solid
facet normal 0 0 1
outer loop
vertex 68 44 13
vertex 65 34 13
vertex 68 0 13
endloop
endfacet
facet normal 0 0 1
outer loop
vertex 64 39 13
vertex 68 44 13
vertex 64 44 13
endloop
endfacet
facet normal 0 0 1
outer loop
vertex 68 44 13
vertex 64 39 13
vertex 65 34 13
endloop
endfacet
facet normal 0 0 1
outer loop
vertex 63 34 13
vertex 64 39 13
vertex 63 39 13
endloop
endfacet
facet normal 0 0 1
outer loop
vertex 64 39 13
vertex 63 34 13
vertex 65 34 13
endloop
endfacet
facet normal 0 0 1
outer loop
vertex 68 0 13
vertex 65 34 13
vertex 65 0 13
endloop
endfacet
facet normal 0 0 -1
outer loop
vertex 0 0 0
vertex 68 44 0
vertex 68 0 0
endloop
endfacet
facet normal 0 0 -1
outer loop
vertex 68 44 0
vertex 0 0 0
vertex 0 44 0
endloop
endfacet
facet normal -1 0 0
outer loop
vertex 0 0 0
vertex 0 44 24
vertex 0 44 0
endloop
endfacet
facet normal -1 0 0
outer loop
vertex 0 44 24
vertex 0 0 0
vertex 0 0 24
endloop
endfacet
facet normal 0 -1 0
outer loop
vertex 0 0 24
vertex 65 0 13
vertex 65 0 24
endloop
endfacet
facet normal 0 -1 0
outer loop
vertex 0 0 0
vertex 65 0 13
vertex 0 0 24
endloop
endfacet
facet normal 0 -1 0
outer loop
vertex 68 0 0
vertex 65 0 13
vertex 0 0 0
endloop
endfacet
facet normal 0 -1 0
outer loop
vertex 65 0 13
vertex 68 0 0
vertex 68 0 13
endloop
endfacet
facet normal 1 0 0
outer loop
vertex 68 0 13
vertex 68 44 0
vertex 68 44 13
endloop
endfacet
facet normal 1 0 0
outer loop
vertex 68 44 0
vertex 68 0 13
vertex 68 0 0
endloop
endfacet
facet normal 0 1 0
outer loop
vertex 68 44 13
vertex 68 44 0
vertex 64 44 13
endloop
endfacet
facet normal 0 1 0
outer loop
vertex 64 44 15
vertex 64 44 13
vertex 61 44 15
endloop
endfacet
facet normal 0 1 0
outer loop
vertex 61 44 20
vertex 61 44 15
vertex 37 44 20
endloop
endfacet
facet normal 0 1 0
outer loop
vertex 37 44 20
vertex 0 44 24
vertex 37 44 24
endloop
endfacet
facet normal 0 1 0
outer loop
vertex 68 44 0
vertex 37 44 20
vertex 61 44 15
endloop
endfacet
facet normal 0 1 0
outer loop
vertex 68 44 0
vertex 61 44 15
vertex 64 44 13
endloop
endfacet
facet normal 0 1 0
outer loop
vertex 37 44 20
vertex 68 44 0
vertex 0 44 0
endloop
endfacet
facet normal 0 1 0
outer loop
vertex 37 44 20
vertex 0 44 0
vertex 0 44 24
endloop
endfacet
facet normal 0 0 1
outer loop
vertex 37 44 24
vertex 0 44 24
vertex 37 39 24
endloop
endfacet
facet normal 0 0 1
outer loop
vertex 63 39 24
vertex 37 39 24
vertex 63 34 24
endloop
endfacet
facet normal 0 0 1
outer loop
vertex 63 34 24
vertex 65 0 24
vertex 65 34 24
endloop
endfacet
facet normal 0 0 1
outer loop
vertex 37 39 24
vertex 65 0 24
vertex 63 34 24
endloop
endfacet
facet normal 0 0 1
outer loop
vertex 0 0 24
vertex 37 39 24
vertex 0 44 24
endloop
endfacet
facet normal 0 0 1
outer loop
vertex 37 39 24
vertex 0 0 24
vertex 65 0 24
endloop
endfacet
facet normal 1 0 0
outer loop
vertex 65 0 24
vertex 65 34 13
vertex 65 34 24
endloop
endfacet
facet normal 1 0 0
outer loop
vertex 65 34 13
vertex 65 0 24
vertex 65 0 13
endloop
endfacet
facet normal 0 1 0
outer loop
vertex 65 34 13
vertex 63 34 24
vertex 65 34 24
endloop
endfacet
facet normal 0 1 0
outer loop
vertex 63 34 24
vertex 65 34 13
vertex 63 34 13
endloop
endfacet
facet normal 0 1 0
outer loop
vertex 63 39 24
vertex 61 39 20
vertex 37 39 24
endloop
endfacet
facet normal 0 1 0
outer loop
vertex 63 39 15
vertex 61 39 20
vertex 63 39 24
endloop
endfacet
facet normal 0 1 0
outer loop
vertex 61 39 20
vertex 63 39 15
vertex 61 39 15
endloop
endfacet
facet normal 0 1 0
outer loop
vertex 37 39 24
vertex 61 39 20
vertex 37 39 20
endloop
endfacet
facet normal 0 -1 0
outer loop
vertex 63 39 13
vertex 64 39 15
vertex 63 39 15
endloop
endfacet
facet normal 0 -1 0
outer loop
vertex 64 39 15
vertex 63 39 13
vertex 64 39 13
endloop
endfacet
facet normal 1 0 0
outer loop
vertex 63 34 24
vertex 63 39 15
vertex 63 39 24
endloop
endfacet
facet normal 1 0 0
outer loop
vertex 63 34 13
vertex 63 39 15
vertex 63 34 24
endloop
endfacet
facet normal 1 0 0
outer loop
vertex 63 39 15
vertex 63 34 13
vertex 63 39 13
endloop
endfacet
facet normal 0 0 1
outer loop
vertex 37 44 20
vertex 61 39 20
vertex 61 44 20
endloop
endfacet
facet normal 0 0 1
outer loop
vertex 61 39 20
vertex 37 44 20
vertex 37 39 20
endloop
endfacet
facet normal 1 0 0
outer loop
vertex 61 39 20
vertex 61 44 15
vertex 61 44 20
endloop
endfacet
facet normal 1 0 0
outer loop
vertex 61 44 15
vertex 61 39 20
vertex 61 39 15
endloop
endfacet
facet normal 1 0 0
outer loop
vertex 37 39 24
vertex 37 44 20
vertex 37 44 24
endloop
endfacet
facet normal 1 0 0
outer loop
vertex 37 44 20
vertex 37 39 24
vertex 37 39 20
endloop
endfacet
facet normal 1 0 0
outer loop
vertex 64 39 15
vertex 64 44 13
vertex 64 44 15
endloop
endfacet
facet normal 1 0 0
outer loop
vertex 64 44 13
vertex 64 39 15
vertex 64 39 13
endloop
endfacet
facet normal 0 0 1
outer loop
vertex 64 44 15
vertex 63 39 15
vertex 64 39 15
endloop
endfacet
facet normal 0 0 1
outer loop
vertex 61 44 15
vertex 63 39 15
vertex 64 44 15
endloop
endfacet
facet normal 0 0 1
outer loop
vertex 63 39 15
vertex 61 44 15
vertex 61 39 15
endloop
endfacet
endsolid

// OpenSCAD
translate([8.5, 5.5, 6.5]) color([0.4226528937805498, 0.8924289339928592, 0.21652428395276402]) cube([17, 11, 13], center=true);
translate([25.5, 5.5, 6.5]) color([0.4352131794546169, 0.35803513461315506, 0.17693553603496914]) cube([17, 11, 13], center=true);
translate([42.5, 5.5, 6.5]) color([0.32881318575191665, 0.9867958186960467, 0.7473090097951195]) cube([17, 11, 13], center=true);
translate([59.5, 5.5, 6.5]) color([0.3826682791831585, 0.40928443439993156, 0.2637409011550663]) cube([17, 11, 13], center=true);
translate([8.5, 16.5, 6.5]) color([0.531336678598825, 0.7356369121419466, 0.686646615750601]) cube([17, 11, 13], center=true);
translate([25.5, 16.5, 6.5]) color([0.46264983534131954, 0.041939046716157, 0.9215078064992686]) cube([17, 11, 13], center=true);
translate([42.5, 16.5, 6.5]) color([0.4089338030960661, 0.3902988670119316, 0.0031101144891549914]) cube([17, 11, 13], center=true);
translate([59.5, 16.5, 6.5]) color([0.13822721408191307, 0.8688534175006787, 0.513934596181303]) cube([17, 11, 13], center=true);
translate([8.5, 27.5, 6.5]) color([0.7324348442226767, 0.14816788643335854, 0.33005100665524945]) cube([17, 11, 13], center=true);
translate([25.5, 27.5, 6.5]) color([0.8401365565378639, 0.8206585211774247, 0.2467942680862406]) cube([17, 11, 13], center=true);
translate([42.5, 27.5, 6.5]) color([0.021975308333072263, 0.8064669735456029, 0.16884400503942165]) cube([17, 11, 13], center=true);
translate([59.5, 27.5, 6.5]) color([0.7876813921208954, 0.6836592298851071, 0.1683147603108942]) cube([17, 11, 13], center=true);
translate([8.5, 38.5, 6.5]) color([0.0784886436699127, 0.9276494299222889, 0.5978783972833935]) cube([17, 11, 13], center=true);
translate([25.5, 38.5, 6.5]) color([0.620510173056511, 0.4575118028380537, 0.15007097732228858]) cube([17, 11, 13], center=true);
translate([42.5, 38.5, 6.5]) color([0.6019699129465877, 0.2524728800375037, 0.8058946560175415]) cube([17, 11, 13], center=true);
translate([59.5, 38.5, 6.5]) color([0.732718954805416, 0.027267185045511733, 0.9324230096450348]) cube([17, 11, 13], center=true);
translate([8.5, 6.5, 18.5]) color([0.03631604832667812, 0.0896193188307074, 0.2927345609042453]) cube([17, 13, 11], center=true);
translate([25.5, 6.5, 18.5]) color([0.1508090604701401, 0.2361450829166024, 0.3558094886115547]) cube([17, 13, 11], center=true);
translate([42.5, 6.5, 18.5]) color([0.7354997154547138, 0.4047113607648444, 0.2698397547254259]) cube([17, 13, 11], center=true);
translate([6.5, 16.5, 18.5]) color([0.4923131536276696, 0.39259324978876053, 0.310764197486207]) cube([13, 7, 11], center=true);
translate([19.5, 16.5, 18.5]) color([0.900541657866744, 0.5504484509596044, 0.9773275109747672]) cube([13, 7, 11], center=true);
translate([32.5, 16.5, 18.5]) color([0.7729124093934382, 0.570499297619577, 0.26244658927686404]) cube([13, 7, 11], center=true);
translate([45.5, 16.5, 18.5]) color([0.6868436562888387, 0.45591771896977173, 0.7213877150417534]) cube([13, 7, 11], center=true);
translate([58.5, 16.5, 18.5]) color([0.40377880891106155, 0.49600503631794757, 0.02068376744575562]) cube([13, 7, 11], center=true);
translate([6.5, 23.5, 18.5]) color([0.739958502320053, 0.03427354435563068, 0.6807253858476396]) cube([13, 7, 11], center=true);
translate([19.5, 23.5, 18.5]) color([0.5820036955379622, 0.7759176114881267, 0.28977759923741564]) cube([13, 7, 11], center=true);
translate([32.5, 23.5, 18.5]) color([0.6861108151233298, 0.20709797563103816, 0.5292720013578311]) cube([13, 7, 11], center=true);
translate([45.5, 23.5, 18.5]) color([0.34028037925118015, 0.9784545513570129, 0.9718665573793185]) cube([13, 7, 11], center=true);
translate([58.5, 23.5, 18.5]) color([0.20896973547336006, 0.5660382358858294, 0.3294426858782725]) cube([13, 7, 11], center=true);
translate([6.5, 30.5, 18.5]) color([0.9685381870202809, 0.9245259481865659, 0.5861458530564896]) cube([13, 7, 11], center=true);
translate([19.5, 30.5, 18.5]) color([0.7200844551084937, 0.6813247567090696, 0.353355632443361]) cube([13, 7, 11], center=true);
translate([32.5, 30.5, 18.5]) color([0.91636156937516, 0.899453536816357, 0.33065846447807934]) cube([13, 7, 11], center=true);
translate([45.5, 30.5, 18.5]) color([0.7473949106043586, 0.009092126674448586, 0.8163591105584419]) cube([13, 7, 11], center=true);
translate([58.5, 30.5, 18.5]) color([0.5648693453979996, 0.9523067127509502, 0.3631930745481745]) cube([13, 7, 11], center=true);
translate([54.5, 6.5, 18.5]) color([0.6257130749033707, 0.3230024315033787, 0.7827853814039997]) cube([7, 13, 11], center=true);
translate([61.5, 6.5, 18.5]) color([0.6007029967830003, 0.9874710229786893, 0.0010127930964535237]) cube([7, 13, 11], center=true);
translate([3.5, 36.5, 18.5]) color([0.14075874215813544, 0.043601382090813434, 0.1258478488128345]) cube([7, 5, 11], center=true);
translate([10.5, 36.5, 18.5]) color([0.9293852970698306, 0.9486082995058949, 0.4804125346981437]) cube([7, 5, 11], center=true);
translate([17.5, 36.5, 18.5]) color([0.9466893945947962, 0.818387610188399, 0.7786177341461099]) cube([7, 5, 11], center=true);
translate([24.5, 36.5, 18.5]) color([0.747281950803196, 0.18765458516959888, 0.5488772611027803]) cube([7, 5, 11], center=true);
translate([31.5, 36.5, 18.5]) color([0.4238792306088448, 0.949788047597888, 0.17383353806681645]) cube([7, 5, 11], center=true);
translate([38.5, 36.5, 18.5]) color([0.16985884355967462, 0.6588617536380149, 0.15740178957348283]) cube([7, 5, 11], center=true);
translate([45.5, 36.5, 18.5]) color([0.11005367295186075, 0.5039231973300066, 0.796660971220008]) cube([7, 5, 11], center=true);
translate([52.5, 36.5, 18.5]) color([0.6050456716470326, 0.7547539728480395, 0.2657585316255522]) cube([7, 5, 11], center=true);
translate([59.5, 36.5, 18.5]) color([0.28496283302929337, 0.42870364173152453, 0.990847884265713]) cube([7, 5, 11], center=true);
translate([3.5, 41.5, 18.5]) color([0.7179182565245089, 0.9462539572878983, 0.537870455736408]) cube([7, 5, 11], center=true);
translate([10.5, 41.5, 18.5]) color([0.5545598515713968, 0.9900903354753839, 0.18998827565888077]) cube([7, 5, 11], center=true);
translate([17.5, 41.5, 18.5]) color([0.7825904371715813, 0.7915138240285756, 0.8447416276181308]) cube([7, 5, 11], center=true);
translate([24.5, 41.5, 18.5]) color([0.7500527092169327, 0.15533301818854706, 0.661127632121674]) cube([7, 5, 11], center=true);
translate([29.5, 41.5, 16.5]) color([0.9237031845862264, 0.5632851524959844, 0.3609415103802872]) cube([3, 5, 7], center=true);
translate([32.5, 41.5, 16.5]) color([0.9495201486078587, 0.5615986504586717, 0.41163639453549183]) cube([3, 5, 7], center=true);
translate([35.5, 41.5, 16.5]) color([0.6141334980612769, 0.8041250166314531, 0.22830209061365048]) cube([3, 5, 7], center=true);
translate([38.5, 41.5, 16.5]) color([0.01569204302297844, 0.5290948970731422, 0.9413574200758085]) cube([3, 5, 7], center=true);
translate([41.5, 41.5, 16.5]) color([0.6802579626031922, 0.6309080001300065, 0.6278151474899732]) cube([3, 5, 7], center=true);
translate([44.5, 41.5, 16.5]) color([0.4969897122617175, 0.7309192697350546, 0.2491944400337247]) cube([3, 5, 7], center=true);
translate([47.5, 41.5, 16.5]) color([0.891754263952968, 0.2744726552452267, 0.9449450132107339]) cube([3, 5, 7], center=true);
translate([50.5, 41.5, 16.5]) color([0.9264967100320902, 0.07792452404752792, 0.44817970124433604]) cube([3, 5, 7], center=true);
translate([53.5, 41.5, 16.5]) color([0.7440362849370825, 0.44965407150807035, 0.5088990248364155]) cube([3, 5, 7], center=true);
translate([56.5, 41.5, 16.5]) color([0.8068239376717178, 0.7049921609492721, 0.9580042227229432]) cube([3, 5, 7], center=true);
translate([59.5, 41.5, 16.5]) color([0.16448599428307875, 0.9235592861863212, 0.9279862525071727]) cube([3, 5, 7], center=true);
translate([29.5, 41.5, 21.0]) color([0.6347489386405218, 0.9403908272970672, 0.25268558738542024]) cube([3, 5, 2], center=true);
translate([29.5, 41.5, 23.0]) color([0.8817872834036474, 0.7734792929601902, 0.6096889997106941]) cube([3, 5, 2], center=true);
translate([32.5, 41.5, 21.0]) color([0.09062924464806255, 0.030134353730962182, 0.01096949549411852]) cube([3, 5, 2], center=true);
translate([32.5, 41.5, 23.0]) color([0.2505580574481764, 0.7623524099431817, 0.3866250323922331]) cube([3, 5, 2], center=true);
translate([35.5, 41.5, 21.0]) color([0.7754467251552132, 0.6256424909314248, 0.3892618991218443]) cube([3, 5, 2], center=true);
translate([35.5, 41.5, 23.0]) color([0.8801466287862422, 0.03841723935819574, 0.465312990207844]) cube([3, 5, 2], center=true);
translate([62.5, 41.5, 14.0]) color([0.8298523393928158, 0.12681348297309336, 0.7104875615116192]) cube([3, 5, 2], center=true);
